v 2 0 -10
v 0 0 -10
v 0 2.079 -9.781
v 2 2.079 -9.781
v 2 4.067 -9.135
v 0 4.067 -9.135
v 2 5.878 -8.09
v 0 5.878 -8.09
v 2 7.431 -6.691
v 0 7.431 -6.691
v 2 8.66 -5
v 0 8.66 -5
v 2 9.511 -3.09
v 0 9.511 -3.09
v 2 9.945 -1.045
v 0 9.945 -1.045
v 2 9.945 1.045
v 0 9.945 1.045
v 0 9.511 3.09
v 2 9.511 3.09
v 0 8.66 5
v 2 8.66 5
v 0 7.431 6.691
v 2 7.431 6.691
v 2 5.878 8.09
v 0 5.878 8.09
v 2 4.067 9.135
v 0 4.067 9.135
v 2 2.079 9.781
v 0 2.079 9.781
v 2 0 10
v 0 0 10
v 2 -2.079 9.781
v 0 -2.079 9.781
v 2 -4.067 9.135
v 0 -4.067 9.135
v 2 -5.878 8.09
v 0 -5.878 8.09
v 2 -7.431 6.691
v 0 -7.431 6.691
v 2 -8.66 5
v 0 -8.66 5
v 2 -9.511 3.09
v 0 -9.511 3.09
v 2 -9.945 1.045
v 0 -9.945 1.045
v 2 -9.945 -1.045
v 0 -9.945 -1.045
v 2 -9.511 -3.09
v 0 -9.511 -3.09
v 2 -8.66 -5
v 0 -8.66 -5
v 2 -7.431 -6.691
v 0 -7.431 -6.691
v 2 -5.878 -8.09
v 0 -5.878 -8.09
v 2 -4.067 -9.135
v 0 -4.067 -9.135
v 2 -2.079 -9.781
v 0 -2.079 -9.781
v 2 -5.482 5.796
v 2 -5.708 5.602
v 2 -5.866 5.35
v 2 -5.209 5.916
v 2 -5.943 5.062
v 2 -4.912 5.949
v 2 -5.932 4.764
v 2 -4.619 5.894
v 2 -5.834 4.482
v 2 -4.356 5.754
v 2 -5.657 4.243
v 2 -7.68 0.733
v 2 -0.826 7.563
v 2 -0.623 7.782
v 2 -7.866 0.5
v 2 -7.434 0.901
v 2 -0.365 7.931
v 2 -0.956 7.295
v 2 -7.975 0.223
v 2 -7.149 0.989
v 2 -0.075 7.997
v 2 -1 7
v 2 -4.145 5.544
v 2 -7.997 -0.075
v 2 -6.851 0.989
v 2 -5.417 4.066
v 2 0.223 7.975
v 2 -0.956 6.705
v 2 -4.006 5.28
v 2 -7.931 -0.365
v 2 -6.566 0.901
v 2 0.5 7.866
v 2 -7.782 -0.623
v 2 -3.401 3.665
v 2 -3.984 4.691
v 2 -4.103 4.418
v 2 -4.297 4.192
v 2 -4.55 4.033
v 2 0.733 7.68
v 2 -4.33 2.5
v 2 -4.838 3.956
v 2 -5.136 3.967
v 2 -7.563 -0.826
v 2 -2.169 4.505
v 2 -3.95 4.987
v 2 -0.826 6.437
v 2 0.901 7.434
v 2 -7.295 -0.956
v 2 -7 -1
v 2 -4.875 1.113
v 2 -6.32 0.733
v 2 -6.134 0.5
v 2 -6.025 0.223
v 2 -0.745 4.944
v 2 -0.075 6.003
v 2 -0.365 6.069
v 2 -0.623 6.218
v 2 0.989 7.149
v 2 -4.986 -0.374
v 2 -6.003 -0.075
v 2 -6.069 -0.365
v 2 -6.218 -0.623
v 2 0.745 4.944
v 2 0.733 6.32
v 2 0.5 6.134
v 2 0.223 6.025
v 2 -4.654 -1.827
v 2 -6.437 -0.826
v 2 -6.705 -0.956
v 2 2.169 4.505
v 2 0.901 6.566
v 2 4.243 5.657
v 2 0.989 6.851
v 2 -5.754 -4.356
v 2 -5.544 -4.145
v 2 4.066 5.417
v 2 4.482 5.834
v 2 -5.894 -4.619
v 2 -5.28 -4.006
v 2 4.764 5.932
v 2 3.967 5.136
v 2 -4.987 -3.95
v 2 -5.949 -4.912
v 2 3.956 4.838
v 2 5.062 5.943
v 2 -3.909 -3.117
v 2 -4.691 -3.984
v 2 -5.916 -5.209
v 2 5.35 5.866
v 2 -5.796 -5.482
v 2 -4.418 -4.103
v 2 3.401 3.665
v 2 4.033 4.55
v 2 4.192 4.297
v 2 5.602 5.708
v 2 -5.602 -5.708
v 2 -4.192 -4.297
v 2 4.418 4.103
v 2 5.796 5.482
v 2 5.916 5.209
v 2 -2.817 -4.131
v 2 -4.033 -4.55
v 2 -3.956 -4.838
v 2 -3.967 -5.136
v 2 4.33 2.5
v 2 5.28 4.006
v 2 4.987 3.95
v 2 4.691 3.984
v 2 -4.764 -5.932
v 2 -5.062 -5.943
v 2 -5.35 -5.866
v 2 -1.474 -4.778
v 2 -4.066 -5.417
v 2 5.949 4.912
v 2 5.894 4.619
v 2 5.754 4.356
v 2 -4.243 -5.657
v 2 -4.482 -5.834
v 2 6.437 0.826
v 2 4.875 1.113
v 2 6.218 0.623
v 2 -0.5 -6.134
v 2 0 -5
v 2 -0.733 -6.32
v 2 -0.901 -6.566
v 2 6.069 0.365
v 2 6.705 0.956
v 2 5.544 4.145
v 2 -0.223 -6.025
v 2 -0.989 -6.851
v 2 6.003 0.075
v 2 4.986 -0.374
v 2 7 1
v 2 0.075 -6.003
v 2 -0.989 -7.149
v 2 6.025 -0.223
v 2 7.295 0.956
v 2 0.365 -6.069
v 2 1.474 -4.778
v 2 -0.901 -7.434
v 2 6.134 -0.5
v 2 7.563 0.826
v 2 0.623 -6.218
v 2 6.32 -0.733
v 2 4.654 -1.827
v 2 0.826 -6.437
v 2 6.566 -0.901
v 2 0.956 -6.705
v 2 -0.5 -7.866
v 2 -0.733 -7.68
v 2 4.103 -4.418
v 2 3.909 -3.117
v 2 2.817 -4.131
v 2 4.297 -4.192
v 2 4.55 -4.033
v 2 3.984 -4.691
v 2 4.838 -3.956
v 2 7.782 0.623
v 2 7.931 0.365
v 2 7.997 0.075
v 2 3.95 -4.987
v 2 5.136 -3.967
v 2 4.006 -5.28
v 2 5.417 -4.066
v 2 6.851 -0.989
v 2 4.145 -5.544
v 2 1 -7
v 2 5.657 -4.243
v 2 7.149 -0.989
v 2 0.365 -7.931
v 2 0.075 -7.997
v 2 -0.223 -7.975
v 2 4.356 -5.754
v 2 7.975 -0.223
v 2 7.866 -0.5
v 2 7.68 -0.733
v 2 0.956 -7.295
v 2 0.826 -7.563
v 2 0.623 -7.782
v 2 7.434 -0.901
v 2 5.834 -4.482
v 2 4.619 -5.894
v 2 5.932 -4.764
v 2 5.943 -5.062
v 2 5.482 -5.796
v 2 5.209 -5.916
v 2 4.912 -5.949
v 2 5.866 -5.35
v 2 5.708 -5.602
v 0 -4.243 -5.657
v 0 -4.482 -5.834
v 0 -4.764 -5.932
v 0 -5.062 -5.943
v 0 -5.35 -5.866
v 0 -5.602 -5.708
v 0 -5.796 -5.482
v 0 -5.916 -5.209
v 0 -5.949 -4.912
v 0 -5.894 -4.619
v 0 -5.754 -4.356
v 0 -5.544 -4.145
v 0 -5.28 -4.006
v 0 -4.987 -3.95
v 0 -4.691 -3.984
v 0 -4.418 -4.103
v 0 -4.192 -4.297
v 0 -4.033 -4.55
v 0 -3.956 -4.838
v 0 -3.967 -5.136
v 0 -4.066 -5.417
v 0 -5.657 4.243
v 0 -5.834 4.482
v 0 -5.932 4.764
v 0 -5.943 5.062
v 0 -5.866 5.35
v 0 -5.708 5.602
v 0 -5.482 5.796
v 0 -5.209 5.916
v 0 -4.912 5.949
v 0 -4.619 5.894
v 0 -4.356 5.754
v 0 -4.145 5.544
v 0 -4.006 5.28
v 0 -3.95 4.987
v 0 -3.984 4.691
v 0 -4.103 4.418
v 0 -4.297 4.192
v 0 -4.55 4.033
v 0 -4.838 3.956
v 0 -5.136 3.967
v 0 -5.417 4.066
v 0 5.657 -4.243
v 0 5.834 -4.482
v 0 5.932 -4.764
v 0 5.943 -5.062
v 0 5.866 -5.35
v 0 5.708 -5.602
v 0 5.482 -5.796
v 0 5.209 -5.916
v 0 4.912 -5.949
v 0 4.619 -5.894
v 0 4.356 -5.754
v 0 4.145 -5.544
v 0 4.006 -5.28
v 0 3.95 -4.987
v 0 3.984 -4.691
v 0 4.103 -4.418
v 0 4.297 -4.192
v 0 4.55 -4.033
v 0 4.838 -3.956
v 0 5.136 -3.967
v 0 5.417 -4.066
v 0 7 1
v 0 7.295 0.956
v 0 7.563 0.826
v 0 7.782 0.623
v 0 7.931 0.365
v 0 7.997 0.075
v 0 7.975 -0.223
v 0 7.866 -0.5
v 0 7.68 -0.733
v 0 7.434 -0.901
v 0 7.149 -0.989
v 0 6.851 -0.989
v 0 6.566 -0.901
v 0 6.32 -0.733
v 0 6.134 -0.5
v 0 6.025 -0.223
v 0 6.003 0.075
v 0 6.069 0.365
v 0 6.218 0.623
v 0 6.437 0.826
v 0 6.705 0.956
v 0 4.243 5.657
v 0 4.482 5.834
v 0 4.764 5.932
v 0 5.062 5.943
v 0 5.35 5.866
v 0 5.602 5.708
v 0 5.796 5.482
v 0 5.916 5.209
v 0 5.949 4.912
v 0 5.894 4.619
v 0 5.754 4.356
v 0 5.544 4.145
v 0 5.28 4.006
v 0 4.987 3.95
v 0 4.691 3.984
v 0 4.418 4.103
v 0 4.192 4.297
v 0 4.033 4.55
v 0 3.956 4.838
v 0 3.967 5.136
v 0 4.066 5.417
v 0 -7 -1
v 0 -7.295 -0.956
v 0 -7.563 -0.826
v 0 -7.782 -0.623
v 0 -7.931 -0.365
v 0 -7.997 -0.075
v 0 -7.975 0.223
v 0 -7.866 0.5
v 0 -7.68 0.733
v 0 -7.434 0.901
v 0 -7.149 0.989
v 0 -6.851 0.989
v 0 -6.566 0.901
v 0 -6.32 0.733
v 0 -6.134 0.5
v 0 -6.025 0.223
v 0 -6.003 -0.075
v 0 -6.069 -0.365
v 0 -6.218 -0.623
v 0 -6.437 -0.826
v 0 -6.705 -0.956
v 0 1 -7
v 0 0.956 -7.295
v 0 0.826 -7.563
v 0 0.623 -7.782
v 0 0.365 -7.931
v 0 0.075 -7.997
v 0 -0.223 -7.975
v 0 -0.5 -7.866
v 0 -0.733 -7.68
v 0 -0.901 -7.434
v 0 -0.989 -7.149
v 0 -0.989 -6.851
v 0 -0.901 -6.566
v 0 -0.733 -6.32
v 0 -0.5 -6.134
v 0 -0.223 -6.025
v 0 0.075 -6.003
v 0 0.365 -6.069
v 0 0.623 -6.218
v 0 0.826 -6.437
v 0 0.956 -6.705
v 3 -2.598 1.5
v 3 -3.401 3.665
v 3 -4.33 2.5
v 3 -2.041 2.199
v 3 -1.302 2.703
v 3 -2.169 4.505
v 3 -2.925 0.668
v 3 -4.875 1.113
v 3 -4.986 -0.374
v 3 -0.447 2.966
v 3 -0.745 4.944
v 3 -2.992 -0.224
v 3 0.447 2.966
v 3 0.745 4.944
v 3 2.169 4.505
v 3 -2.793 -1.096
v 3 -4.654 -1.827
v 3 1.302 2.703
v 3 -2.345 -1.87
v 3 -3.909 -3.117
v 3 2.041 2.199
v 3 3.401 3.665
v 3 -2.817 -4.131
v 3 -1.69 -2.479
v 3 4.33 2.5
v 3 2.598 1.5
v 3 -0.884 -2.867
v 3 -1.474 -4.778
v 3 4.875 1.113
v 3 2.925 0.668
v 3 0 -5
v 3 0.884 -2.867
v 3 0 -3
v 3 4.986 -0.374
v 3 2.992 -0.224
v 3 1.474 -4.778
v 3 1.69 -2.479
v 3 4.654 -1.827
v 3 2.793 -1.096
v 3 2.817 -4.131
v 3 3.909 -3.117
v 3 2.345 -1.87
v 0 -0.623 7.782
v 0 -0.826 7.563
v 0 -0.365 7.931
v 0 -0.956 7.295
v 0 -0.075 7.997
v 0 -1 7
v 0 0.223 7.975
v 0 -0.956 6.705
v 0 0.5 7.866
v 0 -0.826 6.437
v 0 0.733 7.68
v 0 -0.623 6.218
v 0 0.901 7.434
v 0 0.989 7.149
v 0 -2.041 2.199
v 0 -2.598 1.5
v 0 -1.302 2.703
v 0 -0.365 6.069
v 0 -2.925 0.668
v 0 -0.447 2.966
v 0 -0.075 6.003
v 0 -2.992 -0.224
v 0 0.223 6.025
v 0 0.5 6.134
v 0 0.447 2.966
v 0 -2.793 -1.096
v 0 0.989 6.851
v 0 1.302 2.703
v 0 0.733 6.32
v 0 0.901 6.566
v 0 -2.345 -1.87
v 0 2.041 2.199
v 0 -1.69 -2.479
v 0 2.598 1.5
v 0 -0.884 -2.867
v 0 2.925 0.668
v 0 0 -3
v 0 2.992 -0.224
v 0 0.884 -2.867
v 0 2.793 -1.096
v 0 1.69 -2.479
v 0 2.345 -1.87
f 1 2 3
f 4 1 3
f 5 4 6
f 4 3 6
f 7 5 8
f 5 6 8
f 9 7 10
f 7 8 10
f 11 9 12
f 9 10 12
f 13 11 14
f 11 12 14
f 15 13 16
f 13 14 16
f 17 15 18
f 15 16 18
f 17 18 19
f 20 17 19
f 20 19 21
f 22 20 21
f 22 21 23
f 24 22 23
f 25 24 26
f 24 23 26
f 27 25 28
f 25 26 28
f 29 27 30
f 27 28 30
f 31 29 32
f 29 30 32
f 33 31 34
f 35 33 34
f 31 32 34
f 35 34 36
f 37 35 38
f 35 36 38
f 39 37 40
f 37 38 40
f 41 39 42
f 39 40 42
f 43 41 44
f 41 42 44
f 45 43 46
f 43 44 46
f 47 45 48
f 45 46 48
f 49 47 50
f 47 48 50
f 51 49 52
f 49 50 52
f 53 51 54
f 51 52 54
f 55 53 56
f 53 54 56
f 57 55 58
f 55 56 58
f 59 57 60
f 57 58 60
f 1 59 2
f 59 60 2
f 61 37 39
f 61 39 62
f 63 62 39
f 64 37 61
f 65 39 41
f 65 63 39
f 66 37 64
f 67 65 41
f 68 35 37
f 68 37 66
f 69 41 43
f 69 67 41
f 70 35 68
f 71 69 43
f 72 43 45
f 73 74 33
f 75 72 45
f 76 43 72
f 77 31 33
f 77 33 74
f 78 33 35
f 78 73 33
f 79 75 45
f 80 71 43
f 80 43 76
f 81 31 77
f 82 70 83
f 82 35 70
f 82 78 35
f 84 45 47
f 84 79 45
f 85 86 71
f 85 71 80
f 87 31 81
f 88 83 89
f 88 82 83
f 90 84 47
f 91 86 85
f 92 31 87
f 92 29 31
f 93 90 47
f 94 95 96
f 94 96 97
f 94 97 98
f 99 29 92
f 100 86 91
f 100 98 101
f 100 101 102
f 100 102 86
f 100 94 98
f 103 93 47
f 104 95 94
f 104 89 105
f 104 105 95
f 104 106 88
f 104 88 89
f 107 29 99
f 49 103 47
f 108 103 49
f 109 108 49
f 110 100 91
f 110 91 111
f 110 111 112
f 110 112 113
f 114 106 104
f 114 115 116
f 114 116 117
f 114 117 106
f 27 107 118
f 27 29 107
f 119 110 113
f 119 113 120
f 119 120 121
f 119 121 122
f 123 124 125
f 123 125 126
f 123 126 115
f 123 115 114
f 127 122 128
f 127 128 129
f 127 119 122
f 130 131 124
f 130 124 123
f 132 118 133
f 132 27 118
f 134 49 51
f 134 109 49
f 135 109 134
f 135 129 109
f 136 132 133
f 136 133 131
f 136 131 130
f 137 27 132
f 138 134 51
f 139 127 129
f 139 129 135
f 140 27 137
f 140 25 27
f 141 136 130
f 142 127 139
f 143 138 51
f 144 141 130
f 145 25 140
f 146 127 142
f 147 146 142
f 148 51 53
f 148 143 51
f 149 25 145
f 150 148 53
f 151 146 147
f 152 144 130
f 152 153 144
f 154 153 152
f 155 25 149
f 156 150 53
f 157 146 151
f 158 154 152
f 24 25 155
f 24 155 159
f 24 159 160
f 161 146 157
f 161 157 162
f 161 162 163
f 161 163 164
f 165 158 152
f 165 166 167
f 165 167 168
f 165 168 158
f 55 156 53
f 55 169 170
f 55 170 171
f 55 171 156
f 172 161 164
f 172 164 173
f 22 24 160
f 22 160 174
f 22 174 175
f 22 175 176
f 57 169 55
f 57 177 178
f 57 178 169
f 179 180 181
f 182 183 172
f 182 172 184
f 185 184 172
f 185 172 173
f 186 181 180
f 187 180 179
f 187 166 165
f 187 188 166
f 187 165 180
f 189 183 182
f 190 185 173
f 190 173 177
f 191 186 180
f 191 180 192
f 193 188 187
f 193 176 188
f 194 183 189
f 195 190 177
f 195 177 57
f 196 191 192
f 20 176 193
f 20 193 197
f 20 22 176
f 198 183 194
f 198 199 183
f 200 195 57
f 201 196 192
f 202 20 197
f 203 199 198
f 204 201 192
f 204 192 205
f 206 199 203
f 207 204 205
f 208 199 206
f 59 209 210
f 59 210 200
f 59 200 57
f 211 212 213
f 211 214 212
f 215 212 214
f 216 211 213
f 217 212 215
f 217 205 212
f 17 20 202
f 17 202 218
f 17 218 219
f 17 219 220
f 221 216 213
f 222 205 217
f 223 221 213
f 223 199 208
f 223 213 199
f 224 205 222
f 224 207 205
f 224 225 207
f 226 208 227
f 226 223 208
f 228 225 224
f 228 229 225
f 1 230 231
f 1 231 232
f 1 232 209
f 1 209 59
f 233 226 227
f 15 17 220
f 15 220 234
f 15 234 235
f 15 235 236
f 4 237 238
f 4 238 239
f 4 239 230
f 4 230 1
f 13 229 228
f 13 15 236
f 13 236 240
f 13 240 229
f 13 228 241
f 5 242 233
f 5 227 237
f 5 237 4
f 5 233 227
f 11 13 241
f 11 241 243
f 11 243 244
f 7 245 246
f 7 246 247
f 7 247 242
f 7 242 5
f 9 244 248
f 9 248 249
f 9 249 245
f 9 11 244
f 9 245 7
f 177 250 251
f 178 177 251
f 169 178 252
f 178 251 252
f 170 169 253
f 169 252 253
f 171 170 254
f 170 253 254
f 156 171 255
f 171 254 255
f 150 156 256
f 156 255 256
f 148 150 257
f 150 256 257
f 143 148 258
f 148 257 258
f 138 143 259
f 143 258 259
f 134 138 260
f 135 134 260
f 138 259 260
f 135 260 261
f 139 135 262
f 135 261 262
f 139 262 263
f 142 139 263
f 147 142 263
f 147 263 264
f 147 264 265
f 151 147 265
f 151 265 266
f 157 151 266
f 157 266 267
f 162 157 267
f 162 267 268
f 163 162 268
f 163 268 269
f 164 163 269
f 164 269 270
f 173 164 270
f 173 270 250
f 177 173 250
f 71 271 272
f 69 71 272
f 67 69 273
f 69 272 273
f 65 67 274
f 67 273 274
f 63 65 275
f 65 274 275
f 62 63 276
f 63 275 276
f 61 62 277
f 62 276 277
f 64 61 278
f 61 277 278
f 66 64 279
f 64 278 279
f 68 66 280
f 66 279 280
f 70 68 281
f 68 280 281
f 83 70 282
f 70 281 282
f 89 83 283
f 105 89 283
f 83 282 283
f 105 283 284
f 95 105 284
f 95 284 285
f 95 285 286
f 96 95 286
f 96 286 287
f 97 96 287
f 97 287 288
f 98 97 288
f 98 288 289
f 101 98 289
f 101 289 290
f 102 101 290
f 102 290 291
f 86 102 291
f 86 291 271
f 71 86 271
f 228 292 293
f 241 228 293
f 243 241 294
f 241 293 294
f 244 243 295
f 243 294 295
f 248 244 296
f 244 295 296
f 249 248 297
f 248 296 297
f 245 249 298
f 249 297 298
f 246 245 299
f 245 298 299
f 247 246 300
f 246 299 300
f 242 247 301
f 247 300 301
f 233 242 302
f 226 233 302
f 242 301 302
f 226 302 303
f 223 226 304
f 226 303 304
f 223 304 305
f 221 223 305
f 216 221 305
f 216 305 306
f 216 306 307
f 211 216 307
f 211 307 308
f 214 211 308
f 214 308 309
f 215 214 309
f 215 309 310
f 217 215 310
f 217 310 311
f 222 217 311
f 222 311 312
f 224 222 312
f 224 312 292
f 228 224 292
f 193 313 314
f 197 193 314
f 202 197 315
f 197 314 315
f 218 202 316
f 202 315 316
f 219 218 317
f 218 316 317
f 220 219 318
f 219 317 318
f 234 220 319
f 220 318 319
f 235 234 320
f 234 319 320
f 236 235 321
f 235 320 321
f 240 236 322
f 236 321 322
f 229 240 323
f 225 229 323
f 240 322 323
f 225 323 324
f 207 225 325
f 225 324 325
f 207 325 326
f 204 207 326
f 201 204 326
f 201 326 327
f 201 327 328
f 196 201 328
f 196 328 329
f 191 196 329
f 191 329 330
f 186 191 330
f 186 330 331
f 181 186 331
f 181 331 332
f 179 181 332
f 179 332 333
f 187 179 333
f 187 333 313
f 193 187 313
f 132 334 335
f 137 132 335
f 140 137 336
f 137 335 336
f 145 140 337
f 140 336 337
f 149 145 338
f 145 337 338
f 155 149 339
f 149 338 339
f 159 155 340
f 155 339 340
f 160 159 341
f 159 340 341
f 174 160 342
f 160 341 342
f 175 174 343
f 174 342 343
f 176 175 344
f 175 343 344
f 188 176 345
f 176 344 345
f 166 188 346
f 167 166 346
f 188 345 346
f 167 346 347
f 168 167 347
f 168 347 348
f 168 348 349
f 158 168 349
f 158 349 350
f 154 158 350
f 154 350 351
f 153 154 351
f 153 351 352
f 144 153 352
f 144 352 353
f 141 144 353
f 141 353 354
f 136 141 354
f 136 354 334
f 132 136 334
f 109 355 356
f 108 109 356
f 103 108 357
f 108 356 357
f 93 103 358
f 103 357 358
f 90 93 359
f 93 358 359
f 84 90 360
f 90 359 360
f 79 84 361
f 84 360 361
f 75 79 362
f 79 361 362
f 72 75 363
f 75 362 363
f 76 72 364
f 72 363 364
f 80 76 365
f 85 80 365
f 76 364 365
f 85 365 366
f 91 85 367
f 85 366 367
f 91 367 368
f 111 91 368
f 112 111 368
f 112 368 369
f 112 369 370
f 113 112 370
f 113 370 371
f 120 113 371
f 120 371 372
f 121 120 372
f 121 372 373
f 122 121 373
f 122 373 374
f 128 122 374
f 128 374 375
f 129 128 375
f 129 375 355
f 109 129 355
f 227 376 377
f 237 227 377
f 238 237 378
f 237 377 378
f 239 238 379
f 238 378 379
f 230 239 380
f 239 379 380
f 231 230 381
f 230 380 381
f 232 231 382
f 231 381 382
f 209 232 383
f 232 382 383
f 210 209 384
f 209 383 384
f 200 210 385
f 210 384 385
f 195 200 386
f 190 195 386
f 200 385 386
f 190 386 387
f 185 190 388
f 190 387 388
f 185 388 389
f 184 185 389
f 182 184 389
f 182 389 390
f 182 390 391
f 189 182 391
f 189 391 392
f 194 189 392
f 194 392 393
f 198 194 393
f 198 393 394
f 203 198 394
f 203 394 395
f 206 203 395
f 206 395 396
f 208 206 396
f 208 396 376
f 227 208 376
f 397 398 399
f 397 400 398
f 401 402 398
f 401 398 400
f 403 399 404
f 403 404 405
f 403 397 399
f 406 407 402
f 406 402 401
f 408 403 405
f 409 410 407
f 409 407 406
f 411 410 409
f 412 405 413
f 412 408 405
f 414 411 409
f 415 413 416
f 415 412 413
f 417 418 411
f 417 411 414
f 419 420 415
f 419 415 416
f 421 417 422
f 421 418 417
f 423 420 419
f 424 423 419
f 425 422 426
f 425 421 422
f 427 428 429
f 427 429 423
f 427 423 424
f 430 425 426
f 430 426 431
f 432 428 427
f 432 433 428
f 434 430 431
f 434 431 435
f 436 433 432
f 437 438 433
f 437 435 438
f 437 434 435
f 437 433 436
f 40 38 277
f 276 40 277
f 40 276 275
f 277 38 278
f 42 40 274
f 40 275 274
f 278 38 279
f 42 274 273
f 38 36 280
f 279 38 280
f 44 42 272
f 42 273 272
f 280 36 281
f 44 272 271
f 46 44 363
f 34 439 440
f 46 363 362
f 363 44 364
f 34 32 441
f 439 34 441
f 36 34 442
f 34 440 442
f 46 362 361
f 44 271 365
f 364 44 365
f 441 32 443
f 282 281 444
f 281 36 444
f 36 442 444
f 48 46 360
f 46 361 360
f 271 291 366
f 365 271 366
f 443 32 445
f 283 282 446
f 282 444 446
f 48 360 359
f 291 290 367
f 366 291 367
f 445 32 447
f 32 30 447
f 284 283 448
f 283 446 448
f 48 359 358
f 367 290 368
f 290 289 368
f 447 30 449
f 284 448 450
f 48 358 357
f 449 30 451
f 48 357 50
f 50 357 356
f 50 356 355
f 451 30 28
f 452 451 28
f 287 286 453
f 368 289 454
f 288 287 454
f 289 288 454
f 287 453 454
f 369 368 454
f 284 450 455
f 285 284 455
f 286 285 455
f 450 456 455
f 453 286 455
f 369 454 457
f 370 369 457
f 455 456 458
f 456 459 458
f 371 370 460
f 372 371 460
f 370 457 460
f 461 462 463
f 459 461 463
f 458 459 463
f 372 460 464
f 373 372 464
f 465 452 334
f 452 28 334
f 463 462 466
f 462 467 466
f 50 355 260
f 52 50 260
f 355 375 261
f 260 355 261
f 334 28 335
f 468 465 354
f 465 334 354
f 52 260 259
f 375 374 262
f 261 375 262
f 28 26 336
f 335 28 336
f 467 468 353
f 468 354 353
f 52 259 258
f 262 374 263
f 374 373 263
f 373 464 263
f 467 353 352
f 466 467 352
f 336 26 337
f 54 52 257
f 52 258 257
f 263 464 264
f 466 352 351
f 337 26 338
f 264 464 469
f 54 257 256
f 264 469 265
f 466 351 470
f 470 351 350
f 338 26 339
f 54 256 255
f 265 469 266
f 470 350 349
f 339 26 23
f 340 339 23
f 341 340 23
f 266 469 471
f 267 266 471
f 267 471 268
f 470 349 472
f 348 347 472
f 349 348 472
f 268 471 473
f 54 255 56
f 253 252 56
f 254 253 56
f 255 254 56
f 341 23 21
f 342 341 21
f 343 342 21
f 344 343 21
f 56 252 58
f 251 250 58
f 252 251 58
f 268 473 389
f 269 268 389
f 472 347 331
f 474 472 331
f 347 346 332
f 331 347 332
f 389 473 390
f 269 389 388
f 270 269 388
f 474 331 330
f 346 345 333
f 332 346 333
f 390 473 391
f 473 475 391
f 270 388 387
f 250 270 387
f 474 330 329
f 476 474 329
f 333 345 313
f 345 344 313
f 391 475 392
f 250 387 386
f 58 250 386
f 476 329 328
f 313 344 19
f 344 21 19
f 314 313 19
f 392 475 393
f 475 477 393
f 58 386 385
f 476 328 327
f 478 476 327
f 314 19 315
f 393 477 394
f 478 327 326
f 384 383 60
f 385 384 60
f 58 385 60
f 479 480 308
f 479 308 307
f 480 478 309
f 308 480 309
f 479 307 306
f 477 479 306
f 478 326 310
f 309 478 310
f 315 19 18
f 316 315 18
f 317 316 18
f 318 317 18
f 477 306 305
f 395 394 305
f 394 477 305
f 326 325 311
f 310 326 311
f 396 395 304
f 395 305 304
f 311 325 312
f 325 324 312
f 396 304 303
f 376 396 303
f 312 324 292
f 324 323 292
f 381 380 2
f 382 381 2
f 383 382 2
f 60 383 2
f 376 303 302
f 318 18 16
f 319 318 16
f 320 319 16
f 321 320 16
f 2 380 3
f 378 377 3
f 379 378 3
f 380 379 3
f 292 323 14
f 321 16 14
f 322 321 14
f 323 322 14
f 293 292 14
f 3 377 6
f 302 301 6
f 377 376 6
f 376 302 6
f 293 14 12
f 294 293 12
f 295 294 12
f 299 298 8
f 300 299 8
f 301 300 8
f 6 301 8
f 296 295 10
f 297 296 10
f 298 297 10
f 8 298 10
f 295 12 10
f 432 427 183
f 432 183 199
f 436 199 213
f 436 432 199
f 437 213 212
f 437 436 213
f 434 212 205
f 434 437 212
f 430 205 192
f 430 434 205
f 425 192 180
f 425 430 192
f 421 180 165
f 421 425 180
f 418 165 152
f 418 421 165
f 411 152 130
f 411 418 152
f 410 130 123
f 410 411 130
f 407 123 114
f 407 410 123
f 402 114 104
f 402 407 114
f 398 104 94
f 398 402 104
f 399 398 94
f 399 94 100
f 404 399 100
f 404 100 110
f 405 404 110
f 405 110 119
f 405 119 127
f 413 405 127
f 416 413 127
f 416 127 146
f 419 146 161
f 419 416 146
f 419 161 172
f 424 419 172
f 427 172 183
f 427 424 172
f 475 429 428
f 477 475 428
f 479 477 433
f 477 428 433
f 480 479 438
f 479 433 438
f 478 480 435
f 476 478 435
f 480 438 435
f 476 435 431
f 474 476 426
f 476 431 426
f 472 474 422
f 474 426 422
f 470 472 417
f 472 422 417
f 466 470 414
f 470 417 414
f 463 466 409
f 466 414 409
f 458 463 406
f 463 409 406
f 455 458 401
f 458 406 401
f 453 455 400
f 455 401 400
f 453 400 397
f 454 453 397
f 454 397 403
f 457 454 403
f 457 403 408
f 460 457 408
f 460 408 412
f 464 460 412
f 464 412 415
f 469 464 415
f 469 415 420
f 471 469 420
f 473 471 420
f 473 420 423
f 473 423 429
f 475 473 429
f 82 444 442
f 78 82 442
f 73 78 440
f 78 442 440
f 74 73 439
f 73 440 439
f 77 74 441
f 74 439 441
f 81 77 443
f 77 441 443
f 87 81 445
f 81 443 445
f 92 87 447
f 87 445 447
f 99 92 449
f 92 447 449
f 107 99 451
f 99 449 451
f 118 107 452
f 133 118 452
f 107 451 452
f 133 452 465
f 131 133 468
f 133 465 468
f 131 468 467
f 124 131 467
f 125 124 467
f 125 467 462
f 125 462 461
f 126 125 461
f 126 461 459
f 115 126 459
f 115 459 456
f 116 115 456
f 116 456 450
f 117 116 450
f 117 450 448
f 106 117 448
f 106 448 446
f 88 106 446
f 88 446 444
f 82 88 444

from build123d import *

# Parameters (mm, degrees)
SKETCH_1_R               = 10
EXTRUDE_1_DEPTH          = 2
SKETCH_3_R               = 3
CUT_EXTRUDE_1_DEPTH      = 15.282856857
EXTRUDE_START            = 1
SKETCH_4_R               = 5
SKETCH_4_R_2             = 3
EXTRUDE_2_DEPTH          = 1
SKETCH_5_R               = 1
CUT_EXTRUDE_2_DEPTH      = 15.456832295
PATTERN_CIRCULAR_1_COUNT = 8


with BuildPart() as part:
    # 草图1 → 凸台-拉伸1 (new body)
    with BuildSketch(Plane(origin=(0, 0, 0), x_dir=(0, 0, -1), z_dir=(1, 0, 0))):
        Circle(SKETCH_1_R)
    extrude(amount=EXTRUDE_1_DEPTH)

    # 草图3 → 切除-拉伸1 (cut, through all)
    with BuildSketch(Plane(origin=(2, 0, 0), x_dir=(0, 0, -1), z_dir=(1, 0, 0))):
        Circle(SKETCH_3_R)
    extrude(amount=-CUT_EXTRUDE_1_DEPTH, mode=Mode.SUBTRACT)

    # 草图4 → 凸台-拉伸2 (add)
    with BuildSketch(Plane(origin=(2, 0, 0), x_dir=(0, 0, -1), z_dir=(1, 0, 0)).offset(EXTRUDE_START)):
        Circle(SKETCH_4_R)
        Circle(SKETCH_4_R_2, mode=Mode.SUBTRACT)
    extrude(amount=-EXTRUDE_2_DEPTH)

    # 草图5 → 切除-拉伸2 (cut, through all)
    with BuildSketch(Plane.ZY):
        with Locations((0, 7)):
            Circle(SKETCH_5_R)
    cut_extrude_2 = extrude(amount=-CUT_EXTRUDE_2_DEPTH, mode=Mode.SUBTRACT)

    # 阵列(圆周)1: 切除-拉伸2 ×8 about axis
    pattern_circular_1_axis = Axis((0, 0, 0), (1, 0, 0))
    for i in range(1, PATTERN_CIRCULAR_1_COUNT):
        add(cut_extrude_2.rotate(pattern_circular_1_axis, i * 360 / PATTERN_CIRCULAR_1_COUNT), mode=Mode.SUBTRACT)


solid = part.part
